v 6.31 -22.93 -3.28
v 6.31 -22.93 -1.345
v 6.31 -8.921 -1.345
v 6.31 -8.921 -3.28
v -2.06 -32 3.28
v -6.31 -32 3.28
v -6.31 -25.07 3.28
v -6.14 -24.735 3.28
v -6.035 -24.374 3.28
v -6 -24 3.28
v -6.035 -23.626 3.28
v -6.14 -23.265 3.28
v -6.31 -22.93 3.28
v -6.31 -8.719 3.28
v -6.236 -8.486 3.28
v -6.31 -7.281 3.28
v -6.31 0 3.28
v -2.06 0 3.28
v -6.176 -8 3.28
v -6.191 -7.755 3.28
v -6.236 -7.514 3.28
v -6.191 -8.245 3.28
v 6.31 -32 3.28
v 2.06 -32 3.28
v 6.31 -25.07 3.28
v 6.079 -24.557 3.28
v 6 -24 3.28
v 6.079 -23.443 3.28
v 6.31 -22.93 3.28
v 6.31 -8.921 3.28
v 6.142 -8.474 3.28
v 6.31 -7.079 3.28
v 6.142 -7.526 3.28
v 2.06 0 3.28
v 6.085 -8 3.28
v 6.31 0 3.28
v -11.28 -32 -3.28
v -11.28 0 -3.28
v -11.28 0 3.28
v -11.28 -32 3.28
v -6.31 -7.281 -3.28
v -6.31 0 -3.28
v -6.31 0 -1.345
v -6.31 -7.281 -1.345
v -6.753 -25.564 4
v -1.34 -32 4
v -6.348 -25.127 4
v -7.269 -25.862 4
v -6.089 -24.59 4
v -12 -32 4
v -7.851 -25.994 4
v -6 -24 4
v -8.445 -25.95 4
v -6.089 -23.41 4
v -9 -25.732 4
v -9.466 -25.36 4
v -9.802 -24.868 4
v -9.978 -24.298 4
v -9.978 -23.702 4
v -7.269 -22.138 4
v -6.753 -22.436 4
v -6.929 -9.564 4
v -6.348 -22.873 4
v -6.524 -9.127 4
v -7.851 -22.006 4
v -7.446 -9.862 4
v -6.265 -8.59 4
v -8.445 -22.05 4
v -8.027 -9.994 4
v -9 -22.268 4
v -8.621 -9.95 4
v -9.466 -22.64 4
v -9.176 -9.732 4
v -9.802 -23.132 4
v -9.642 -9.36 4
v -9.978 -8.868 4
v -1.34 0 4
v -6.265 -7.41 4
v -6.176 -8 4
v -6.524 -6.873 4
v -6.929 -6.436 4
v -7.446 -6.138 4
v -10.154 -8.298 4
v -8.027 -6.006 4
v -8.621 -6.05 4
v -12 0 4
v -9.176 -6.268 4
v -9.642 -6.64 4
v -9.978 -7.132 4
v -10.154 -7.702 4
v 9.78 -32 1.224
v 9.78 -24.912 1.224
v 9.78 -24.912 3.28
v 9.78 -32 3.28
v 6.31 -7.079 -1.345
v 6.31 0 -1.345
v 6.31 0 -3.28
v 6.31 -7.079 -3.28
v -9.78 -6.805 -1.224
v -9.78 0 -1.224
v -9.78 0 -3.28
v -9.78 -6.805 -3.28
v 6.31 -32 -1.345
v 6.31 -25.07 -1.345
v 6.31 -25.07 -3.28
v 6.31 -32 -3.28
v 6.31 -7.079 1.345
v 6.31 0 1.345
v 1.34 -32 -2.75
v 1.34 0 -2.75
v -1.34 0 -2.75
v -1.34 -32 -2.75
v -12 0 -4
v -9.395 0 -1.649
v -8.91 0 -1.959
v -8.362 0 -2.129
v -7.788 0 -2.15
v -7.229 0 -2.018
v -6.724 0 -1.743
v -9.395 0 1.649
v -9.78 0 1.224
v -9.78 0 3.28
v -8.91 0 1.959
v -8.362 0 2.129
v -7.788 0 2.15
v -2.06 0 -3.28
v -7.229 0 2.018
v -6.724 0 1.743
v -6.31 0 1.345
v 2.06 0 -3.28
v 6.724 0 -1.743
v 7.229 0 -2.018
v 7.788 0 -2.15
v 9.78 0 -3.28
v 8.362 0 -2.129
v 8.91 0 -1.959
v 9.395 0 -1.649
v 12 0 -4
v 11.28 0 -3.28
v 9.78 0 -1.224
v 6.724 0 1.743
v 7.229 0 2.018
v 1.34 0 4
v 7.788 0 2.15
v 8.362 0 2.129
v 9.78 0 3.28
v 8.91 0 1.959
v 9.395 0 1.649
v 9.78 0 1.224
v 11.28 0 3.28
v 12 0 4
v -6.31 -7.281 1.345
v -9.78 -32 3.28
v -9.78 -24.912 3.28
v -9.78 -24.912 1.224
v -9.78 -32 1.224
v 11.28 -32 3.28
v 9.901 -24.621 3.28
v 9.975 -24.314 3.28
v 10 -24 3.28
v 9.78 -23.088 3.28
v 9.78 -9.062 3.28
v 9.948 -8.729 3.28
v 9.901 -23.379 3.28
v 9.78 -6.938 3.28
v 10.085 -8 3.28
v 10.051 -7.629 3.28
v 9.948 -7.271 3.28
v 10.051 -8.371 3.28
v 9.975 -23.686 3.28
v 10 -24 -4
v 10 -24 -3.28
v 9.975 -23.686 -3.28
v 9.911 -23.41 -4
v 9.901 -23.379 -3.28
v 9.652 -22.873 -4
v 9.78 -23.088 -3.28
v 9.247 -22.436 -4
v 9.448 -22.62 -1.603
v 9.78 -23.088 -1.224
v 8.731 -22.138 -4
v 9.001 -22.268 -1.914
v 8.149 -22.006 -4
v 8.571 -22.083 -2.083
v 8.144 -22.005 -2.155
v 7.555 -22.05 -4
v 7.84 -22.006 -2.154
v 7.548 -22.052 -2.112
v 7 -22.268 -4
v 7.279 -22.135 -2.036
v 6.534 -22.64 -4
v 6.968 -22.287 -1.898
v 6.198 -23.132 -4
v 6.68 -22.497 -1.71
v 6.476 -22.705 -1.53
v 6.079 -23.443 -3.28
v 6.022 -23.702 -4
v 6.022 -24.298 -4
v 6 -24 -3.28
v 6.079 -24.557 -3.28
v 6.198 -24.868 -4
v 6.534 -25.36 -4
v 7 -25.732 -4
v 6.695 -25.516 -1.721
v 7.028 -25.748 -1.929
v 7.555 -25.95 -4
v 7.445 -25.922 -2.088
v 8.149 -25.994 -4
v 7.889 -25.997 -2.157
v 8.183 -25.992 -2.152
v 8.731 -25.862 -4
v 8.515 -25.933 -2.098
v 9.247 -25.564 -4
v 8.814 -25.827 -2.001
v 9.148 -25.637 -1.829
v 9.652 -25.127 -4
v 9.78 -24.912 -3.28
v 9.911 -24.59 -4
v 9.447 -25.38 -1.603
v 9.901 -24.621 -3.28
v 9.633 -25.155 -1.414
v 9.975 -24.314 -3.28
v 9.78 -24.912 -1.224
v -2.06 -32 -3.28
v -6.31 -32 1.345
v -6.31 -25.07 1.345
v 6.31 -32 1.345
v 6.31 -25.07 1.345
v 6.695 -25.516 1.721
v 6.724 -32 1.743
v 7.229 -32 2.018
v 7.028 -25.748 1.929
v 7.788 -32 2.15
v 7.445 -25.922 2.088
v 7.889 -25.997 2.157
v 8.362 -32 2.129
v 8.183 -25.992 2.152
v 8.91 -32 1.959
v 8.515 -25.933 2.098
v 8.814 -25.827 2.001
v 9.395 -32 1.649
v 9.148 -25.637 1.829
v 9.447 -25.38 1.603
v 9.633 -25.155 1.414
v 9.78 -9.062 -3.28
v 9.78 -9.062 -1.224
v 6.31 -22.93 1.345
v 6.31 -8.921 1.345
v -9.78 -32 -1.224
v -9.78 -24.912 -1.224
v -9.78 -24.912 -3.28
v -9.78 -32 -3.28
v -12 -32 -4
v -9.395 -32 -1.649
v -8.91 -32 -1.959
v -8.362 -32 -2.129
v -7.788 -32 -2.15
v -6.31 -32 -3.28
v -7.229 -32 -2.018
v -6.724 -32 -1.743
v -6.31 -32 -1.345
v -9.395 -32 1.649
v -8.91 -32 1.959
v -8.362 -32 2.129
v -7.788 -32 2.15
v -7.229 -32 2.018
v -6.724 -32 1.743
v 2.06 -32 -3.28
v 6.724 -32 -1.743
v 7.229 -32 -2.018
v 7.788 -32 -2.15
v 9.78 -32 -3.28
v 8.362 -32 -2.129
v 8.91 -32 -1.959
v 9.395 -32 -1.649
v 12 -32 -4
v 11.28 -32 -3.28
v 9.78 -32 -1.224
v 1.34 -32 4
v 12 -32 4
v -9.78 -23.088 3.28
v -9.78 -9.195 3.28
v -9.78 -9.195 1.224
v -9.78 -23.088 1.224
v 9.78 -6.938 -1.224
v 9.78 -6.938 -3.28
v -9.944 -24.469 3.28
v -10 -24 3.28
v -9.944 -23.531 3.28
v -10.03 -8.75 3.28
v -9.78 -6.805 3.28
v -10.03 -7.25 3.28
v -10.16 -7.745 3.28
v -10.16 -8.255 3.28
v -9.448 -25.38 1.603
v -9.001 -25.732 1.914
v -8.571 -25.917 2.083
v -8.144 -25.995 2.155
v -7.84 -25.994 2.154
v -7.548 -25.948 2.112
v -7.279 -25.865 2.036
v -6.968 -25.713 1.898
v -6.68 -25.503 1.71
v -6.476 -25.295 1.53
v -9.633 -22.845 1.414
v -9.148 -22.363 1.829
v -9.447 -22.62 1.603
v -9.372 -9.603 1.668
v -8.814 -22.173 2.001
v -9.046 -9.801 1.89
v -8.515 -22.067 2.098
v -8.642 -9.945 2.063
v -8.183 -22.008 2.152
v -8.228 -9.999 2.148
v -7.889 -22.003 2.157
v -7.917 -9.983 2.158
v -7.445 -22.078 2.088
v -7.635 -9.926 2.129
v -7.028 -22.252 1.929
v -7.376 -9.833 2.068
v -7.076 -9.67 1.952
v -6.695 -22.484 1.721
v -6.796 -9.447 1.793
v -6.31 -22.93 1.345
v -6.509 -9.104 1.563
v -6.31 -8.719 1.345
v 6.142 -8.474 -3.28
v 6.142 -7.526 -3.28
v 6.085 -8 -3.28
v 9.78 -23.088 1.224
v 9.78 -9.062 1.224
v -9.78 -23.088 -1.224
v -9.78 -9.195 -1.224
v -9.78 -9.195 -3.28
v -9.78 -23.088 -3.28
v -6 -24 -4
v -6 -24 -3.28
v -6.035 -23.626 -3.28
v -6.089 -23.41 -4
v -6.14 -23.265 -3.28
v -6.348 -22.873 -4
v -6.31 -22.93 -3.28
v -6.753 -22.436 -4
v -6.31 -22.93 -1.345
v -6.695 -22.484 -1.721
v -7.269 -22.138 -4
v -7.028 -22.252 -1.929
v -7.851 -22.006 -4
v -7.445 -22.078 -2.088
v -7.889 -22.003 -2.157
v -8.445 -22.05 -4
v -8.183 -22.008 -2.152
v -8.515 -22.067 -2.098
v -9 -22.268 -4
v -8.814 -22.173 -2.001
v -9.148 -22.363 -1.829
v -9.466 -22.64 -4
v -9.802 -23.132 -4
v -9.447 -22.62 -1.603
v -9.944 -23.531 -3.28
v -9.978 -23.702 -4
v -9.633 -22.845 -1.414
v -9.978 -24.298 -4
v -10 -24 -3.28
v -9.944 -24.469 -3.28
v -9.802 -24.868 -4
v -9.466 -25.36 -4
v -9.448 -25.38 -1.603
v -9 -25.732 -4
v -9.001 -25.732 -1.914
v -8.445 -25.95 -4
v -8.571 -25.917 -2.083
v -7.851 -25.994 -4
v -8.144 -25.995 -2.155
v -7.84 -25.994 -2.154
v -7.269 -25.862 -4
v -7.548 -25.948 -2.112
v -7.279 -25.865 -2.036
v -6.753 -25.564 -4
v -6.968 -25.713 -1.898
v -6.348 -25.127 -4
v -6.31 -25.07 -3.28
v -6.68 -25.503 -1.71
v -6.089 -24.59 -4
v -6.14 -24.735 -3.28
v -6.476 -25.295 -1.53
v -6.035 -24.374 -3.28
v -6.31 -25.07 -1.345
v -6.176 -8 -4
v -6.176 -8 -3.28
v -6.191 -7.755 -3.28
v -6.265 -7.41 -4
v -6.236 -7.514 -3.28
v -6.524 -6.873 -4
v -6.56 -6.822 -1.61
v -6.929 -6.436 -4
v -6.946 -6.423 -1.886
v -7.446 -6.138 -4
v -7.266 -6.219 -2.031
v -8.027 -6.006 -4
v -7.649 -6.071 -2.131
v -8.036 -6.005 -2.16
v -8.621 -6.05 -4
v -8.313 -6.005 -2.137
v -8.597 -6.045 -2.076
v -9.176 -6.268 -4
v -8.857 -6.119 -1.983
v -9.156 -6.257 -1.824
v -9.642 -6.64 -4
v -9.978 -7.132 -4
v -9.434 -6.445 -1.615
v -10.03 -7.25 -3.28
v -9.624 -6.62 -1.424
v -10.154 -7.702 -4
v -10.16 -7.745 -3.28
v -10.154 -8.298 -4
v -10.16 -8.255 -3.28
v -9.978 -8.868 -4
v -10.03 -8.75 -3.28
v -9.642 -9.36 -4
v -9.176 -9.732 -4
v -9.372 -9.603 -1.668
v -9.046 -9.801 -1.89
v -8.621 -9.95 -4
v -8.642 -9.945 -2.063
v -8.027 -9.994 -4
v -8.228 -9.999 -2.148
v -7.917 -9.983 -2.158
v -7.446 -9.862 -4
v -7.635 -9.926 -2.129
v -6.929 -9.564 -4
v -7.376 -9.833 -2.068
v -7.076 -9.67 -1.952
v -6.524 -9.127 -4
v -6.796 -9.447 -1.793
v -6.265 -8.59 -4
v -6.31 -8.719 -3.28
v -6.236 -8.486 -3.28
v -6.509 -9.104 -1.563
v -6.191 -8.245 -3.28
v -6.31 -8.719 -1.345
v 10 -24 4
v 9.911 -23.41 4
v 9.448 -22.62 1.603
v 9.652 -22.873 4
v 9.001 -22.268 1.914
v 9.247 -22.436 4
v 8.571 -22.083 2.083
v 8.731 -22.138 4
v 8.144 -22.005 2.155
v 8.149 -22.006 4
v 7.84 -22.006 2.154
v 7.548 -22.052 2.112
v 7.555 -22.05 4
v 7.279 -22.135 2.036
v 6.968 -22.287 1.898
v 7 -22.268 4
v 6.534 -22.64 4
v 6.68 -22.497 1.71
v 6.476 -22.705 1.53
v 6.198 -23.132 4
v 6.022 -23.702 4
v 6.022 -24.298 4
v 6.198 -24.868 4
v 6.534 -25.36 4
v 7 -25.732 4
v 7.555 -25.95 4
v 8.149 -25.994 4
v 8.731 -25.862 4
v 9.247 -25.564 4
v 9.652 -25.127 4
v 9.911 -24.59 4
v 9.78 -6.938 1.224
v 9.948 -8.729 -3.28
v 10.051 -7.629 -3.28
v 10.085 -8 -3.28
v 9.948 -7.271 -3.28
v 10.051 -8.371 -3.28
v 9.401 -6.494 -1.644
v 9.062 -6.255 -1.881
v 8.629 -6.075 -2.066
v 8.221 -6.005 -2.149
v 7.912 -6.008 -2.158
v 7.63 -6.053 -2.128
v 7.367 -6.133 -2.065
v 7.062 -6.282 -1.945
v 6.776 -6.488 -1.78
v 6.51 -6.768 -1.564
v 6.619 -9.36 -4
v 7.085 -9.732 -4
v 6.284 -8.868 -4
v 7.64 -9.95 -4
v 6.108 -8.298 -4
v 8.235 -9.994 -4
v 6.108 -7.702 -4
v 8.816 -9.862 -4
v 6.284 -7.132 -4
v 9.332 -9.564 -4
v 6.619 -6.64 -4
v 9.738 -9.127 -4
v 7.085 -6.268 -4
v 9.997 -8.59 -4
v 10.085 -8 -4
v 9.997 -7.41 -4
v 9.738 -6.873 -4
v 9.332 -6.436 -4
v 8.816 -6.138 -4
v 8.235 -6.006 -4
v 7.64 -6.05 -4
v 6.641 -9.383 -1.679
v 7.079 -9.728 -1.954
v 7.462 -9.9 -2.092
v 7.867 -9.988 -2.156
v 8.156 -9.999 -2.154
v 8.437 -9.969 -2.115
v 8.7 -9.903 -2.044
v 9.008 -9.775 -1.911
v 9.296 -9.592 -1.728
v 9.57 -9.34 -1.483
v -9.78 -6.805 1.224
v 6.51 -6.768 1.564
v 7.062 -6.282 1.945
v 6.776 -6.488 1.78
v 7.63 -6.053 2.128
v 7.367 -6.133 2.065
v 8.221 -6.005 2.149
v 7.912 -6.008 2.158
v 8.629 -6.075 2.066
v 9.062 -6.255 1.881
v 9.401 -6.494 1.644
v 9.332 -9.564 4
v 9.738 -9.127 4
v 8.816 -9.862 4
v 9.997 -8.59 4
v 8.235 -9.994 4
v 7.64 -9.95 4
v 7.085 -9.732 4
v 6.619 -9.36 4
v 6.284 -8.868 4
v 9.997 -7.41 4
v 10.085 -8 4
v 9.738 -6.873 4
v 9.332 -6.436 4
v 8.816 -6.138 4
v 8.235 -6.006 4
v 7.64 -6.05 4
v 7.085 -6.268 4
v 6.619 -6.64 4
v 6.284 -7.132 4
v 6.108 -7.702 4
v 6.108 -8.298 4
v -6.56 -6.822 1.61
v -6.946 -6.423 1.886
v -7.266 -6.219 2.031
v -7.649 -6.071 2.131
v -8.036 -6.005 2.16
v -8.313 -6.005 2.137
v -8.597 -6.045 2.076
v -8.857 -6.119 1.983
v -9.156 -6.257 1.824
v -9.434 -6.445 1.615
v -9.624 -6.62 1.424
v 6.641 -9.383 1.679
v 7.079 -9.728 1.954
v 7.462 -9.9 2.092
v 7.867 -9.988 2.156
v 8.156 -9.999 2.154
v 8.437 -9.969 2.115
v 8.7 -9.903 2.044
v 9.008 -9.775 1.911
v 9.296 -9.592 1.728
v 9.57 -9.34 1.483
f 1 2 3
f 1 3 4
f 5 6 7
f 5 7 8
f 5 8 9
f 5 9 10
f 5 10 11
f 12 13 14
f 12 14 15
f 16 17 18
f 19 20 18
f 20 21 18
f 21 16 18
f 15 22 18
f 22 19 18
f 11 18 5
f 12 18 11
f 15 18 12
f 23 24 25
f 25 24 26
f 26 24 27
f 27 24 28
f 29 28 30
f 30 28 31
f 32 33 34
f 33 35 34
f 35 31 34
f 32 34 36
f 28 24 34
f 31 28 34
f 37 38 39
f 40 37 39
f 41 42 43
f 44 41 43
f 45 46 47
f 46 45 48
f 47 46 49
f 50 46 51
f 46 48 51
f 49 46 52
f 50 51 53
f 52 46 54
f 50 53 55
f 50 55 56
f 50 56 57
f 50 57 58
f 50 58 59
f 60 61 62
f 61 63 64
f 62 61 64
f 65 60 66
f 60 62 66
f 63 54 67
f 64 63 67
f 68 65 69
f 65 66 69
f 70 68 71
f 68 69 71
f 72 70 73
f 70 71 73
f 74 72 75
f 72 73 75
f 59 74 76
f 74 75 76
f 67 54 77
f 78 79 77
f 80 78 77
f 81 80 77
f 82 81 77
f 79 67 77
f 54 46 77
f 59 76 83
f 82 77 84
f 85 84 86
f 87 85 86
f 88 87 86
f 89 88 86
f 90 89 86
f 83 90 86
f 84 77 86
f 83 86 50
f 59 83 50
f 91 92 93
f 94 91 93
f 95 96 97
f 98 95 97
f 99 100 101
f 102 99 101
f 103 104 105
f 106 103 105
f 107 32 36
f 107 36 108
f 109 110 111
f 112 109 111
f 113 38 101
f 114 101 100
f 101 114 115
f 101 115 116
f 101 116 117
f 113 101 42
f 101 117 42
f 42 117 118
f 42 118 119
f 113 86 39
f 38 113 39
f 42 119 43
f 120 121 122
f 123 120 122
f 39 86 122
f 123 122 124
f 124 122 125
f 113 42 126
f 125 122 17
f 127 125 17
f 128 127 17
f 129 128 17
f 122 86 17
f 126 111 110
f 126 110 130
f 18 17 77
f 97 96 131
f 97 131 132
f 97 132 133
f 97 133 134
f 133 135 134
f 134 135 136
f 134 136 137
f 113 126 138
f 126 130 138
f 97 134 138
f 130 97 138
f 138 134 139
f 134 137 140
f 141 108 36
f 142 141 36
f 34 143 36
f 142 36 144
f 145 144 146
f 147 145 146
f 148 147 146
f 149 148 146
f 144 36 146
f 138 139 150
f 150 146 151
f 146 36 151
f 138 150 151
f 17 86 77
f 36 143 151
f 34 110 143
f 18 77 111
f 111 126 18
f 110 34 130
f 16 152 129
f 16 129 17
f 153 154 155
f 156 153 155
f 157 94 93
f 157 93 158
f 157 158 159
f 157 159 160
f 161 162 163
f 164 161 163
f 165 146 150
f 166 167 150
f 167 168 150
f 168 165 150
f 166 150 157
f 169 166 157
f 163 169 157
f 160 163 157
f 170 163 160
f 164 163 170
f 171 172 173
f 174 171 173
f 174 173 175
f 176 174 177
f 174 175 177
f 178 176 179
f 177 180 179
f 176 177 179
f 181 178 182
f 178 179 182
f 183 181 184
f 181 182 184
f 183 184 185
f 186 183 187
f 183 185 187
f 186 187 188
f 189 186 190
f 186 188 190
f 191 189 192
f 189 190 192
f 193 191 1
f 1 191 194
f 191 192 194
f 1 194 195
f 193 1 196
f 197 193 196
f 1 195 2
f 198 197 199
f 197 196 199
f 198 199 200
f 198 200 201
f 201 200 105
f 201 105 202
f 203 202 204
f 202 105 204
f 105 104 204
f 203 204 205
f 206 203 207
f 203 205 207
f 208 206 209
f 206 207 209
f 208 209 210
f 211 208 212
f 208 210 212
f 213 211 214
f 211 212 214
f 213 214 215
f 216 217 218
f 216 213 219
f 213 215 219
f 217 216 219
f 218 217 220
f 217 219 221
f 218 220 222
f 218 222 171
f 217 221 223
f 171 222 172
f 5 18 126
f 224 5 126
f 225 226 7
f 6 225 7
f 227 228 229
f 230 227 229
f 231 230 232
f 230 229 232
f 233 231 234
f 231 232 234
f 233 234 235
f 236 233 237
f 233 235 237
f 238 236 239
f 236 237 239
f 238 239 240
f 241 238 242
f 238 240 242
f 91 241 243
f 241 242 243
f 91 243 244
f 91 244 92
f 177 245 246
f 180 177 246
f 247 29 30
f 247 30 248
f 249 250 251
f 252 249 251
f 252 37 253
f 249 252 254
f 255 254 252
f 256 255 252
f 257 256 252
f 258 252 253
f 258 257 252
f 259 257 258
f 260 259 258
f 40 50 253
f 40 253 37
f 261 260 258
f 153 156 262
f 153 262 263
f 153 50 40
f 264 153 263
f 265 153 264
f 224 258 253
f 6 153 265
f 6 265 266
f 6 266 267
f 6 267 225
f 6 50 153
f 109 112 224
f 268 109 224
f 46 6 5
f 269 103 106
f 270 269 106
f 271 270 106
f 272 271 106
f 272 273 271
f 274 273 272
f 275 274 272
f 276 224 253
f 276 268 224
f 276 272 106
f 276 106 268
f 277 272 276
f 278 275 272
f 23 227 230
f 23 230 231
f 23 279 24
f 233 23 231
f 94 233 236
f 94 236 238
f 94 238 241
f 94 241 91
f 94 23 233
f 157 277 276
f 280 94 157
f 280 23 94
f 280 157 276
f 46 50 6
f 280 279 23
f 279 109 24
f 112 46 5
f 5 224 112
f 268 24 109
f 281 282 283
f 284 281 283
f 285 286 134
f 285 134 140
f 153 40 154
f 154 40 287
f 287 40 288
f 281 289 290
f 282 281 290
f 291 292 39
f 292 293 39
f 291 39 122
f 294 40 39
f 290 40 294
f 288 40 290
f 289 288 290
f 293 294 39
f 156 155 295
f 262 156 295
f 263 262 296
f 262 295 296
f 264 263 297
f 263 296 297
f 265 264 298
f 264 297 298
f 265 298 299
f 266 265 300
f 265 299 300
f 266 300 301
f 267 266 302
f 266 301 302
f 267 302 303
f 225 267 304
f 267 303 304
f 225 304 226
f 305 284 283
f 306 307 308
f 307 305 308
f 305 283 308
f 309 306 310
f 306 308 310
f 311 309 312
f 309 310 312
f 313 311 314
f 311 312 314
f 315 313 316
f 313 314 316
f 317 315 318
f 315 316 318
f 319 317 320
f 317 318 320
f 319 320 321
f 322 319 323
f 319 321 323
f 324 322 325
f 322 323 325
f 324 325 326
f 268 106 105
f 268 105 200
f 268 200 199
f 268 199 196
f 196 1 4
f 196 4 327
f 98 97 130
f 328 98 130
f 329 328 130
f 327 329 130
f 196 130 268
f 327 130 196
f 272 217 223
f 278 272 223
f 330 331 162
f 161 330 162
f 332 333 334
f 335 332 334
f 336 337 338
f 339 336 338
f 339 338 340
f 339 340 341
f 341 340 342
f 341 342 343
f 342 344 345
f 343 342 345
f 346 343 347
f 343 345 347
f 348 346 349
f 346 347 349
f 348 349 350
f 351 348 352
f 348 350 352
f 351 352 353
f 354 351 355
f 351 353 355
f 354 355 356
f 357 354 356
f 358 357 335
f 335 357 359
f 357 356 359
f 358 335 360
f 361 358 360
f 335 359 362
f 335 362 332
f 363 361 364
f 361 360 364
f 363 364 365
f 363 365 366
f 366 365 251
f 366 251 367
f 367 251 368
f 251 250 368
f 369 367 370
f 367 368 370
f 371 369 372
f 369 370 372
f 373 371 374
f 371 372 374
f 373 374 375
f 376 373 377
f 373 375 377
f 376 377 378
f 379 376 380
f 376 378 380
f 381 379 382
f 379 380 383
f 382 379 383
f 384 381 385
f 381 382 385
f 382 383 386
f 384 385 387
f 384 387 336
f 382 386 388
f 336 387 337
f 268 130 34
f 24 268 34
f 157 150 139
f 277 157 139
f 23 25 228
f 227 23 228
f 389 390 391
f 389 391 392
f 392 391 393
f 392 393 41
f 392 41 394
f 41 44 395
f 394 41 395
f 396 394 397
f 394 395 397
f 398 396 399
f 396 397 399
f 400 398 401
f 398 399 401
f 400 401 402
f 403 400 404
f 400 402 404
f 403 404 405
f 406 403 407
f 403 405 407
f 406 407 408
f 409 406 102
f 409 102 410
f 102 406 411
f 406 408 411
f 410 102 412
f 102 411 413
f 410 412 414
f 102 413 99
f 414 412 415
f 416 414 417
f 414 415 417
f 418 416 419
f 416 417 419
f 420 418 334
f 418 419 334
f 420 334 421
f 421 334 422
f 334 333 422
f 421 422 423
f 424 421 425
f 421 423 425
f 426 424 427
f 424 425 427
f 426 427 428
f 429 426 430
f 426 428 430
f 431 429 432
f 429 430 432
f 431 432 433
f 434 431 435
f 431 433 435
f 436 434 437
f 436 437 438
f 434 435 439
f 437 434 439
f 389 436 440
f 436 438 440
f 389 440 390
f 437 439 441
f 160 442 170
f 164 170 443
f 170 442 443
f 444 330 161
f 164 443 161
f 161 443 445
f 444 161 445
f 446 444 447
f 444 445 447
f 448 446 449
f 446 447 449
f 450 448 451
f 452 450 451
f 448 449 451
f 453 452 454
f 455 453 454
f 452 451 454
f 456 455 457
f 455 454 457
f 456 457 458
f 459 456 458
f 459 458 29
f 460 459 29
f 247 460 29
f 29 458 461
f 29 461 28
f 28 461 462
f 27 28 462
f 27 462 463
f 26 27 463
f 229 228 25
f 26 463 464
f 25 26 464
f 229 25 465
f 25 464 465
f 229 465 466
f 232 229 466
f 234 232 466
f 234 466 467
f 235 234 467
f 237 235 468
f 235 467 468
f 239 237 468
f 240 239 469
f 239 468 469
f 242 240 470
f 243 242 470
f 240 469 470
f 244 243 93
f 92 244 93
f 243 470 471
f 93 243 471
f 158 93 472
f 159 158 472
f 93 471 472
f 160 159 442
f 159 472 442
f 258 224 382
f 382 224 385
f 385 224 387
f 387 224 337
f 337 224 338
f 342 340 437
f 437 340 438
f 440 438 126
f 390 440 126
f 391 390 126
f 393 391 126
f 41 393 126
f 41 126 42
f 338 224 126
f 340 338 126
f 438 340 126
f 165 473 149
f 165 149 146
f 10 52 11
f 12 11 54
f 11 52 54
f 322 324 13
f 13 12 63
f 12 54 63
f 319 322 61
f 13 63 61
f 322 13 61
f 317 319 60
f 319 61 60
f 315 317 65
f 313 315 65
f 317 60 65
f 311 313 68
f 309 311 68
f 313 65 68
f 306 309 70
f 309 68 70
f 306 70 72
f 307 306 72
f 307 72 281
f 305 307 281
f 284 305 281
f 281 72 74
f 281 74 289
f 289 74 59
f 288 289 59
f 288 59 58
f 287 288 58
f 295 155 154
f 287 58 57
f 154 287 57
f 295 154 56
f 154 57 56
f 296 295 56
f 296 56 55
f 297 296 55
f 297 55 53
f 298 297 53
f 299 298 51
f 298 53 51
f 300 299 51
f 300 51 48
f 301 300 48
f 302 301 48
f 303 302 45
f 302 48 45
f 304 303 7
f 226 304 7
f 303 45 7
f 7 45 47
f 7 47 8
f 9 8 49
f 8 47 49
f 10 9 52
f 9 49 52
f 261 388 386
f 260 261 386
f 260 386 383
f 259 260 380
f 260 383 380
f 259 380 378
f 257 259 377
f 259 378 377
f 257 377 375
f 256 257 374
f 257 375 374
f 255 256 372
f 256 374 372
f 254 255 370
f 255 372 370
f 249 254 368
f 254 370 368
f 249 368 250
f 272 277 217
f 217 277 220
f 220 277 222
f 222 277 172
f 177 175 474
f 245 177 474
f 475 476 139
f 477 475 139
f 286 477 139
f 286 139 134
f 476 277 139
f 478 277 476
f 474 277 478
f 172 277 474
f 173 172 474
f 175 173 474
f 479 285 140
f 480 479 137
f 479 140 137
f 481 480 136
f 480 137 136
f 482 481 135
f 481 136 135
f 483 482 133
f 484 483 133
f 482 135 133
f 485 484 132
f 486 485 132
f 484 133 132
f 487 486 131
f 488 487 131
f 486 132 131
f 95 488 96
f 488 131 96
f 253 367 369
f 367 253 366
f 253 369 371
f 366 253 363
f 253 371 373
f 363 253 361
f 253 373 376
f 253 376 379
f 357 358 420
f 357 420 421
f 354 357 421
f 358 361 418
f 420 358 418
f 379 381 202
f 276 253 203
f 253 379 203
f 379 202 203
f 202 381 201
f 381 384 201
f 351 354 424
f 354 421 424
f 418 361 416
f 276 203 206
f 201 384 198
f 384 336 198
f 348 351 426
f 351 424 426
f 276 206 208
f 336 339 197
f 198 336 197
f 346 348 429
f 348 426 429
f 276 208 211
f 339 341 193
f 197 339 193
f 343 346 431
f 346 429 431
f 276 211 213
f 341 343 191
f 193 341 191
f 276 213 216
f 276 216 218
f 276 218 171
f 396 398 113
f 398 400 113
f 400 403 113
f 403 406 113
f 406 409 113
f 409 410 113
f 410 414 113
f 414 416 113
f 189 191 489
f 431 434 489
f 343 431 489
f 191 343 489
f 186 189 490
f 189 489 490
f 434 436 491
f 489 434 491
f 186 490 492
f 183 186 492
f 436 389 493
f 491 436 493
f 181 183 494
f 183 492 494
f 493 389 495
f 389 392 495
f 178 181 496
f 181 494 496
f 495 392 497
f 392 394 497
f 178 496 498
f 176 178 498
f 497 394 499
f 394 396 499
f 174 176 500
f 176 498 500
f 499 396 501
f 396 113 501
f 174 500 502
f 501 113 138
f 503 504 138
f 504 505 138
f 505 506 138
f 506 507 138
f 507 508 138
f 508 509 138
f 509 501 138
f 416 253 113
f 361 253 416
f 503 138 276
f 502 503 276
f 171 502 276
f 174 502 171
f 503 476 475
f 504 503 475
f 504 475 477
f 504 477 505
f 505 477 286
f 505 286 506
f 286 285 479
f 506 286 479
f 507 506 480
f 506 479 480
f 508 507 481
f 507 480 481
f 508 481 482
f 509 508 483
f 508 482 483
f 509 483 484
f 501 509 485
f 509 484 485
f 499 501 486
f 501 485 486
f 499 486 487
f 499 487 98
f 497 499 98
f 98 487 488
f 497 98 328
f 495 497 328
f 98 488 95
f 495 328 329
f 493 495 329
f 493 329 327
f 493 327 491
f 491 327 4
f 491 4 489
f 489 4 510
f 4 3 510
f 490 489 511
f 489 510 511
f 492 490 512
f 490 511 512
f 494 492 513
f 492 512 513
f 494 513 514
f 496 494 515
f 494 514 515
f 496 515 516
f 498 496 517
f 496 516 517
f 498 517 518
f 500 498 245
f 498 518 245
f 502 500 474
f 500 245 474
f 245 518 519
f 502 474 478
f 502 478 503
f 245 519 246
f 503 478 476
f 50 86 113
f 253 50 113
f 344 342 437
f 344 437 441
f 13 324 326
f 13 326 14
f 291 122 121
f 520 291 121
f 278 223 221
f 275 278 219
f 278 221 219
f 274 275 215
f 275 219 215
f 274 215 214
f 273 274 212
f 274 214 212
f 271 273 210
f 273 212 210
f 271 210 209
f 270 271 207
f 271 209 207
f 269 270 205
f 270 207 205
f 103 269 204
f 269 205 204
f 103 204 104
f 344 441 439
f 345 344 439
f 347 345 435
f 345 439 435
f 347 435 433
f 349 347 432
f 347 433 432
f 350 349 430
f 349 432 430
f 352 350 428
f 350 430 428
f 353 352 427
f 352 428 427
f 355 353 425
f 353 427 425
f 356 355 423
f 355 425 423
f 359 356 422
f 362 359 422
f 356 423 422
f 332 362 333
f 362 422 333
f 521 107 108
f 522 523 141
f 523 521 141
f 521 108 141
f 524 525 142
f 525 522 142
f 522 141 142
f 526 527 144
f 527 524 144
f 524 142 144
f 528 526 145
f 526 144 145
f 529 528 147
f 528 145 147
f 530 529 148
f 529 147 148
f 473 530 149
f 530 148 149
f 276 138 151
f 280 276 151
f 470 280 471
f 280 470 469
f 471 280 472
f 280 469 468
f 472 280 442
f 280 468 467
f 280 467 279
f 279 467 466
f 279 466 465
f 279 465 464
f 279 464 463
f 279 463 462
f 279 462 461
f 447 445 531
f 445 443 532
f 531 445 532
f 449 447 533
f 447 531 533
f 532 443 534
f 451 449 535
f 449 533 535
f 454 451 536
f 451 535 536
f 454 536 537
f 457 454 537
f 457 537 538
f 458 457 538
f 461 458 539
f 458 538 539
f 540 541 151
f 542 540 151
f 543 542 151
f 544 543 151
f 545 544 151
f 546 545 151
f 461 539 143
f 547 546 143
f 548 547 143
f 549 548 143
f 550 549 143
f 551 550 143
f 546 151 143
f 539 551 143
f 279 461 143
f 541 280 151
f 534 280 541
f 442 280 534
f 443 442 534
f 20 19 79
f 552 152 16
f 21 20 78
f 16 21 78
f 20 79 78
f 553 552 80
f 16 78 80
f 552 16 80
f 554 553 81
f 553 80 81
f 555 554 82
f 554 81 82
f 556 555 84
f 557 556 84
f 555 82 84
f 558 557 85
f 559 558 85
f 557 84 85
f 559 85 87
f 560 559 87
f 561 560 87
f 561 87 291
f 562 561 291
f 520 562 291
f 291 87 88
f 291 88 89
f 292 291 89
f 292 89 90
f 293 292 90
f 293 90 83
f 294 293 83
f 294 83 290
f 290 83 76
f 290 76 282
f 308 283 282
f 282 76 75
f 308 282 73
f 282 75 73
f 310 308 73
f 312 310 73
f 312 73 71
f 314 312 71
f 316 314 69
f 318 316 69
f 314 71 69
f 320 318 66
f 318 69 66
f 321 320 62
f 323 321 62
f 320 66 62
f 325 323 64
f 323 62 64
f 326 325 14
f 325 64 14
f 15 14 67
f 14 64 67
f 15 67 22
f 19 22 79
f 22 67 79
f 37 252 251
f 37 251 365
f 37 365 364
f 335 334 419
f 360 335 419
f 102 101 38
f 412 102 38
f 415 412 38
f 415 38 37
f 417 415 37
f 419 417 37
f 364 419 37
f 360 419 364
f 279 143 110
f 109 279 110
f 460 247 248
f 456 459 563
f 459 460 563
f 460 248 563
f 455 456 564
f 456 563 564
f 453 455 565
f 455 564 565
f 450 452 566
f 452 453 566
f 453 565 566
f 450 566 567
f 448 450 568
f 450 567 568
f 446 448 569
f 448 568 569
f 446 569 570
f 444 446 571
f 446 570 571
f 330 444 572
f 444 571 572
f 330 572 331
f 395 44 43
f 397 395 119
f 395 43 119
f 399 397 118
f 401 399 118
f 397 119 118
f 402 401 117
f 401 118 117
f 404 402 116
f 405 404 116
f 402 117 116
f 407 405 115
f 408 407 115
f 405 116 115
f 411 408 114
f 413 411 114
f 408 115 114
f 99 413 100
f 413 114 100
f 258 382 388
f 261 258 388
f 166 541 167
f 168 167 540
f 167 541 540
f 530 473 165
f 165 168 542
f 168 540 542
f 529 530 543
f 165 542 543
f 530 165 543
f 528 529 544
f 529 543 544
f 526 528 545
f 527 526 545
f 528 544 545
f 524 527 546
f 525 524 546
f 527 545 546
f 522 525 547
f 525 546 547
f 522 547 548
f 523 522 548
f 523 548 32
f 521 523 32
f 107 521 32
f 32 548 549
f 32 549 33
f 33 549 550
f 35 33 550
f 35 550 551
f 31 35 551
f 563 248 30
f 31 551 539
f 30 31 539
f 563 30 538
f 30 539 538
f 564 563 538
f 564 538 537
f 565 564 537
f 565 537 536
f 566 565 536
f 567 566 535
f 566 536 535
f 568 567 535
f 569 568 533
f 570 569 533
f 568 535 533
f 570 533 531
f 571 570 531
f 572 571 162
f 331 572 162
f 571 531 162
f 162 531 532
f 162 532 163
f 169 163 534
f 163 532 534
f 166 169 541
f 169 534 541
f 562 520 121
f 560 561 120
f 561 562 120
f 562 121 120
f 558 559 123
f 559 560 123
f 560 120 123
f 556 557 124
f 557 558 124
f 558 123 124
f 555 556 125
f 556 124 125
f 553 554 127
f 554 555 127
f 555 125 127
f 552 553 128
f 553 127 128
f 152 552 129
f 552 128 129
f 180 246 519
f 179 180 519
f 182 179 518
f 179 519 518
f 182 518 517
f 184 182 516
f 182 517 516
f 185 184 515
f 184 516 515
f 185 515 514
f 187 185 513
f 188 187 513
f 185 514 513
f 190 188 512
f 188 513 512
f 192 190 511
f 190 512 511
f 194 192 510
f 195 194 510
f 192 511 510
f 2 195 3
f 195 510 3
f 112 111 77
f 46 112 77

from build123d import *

# Parameters (mm, degrees)
F1_DEPTH = 32
F2_R     = 2
F3_DEPTH = 8.1


with BuildPart() as f1:
    # F0 (on Front) → F1 (new body)
    with BuildSketch(Plane.XZ):
        Polygon((-1.34, 4), (-12, 4), (-12, -4), (12, -4), (12, 4), (1.34, 4), (1.34, -2.75), (-1.34, -2.75), align=None)
        Polygon((-6.31, 3.28), (-2.06, 3.28), (-2.06, -3.28), (-6.31, -3.28), (-9.78, -3.28), (-11.28, -3.28), (-11.28, 3.28), (-9.78, 3.28), align=None, mode=Mode.SUBTRACT)
        Polygon((11.28, 3.28), (11.28, -3.28), (9.78, -3.28), (6.31, -3.28), (2.06, -3.28), (2.06, 3.28), (6.31, 3.28), (9.78, 3.28), align=None, mode=Mode.SUBTRACT)
        with BuildLine():
            Line((-6.31, 1.345177), (-6.31, 3.28))
            Line((-6.31, 3.28), (-9.78, 3.28))
            Line((-9.78, 3.28), (-9.78, 1.223601))
            ThreePointArc((-9.78, 1.223601), (-8.075632, 2.158675), (-6.31, 1.345177))
        make_face()
        with BuildLine():
            Line((-9.78, -3.28), (-6.31, -3.28))
            Line((-6.31, -3.28), (-6.31, -1.345177))
            ThreePointArc((-6.31, -1.345177), (-8.075632, -2.158675), (-9.78, -1.223601))
            Line((-9.78, -1.223601), (-9.78, -3.28))
        make_face()
        with BuildLine():
            Line((9.78, 1.223601), (9.78, 3.28))
            Line((9.78, 3.28), (6.31, 3.28))
            Line((6.31, 3.28), (6.31, 1.345177))
            ThreePointArc((6.31, 1.345177), (8.075632, 2.158675), (9.78, 1.223601))
        make_face()
        with BuildLine():
            Line((6.31, -3.28), (9.78, -3.28))
            Line((9.78, -3.28), (9.78, -1.223601))
            ThreePointArc((9.78, -1.223601), (8.075632, -2.158675), (6.31, -1.345177))
            Line((6.31, -1.345177), (6.31, -3.28))
        make_face()
    extrude(amount=F1_DEPTH)

    # F2 (on face) → F3 (cut)
    with BuildSketch(Plane.XY.offset(4)):
        with Locations((-8, -24)):
            Circle(F2_R)
        with Locations((8, -24)):
            Circle(F2_R)
        with Locations((-8.176223, -8)):
            Circle(F2_R)
        with Locations((8.085492, -8)):
            Circle(F2_R)
    extrude(amount=-F3_DEPTH, mode=Mode.SUBTRACT)


solid = f1.part
